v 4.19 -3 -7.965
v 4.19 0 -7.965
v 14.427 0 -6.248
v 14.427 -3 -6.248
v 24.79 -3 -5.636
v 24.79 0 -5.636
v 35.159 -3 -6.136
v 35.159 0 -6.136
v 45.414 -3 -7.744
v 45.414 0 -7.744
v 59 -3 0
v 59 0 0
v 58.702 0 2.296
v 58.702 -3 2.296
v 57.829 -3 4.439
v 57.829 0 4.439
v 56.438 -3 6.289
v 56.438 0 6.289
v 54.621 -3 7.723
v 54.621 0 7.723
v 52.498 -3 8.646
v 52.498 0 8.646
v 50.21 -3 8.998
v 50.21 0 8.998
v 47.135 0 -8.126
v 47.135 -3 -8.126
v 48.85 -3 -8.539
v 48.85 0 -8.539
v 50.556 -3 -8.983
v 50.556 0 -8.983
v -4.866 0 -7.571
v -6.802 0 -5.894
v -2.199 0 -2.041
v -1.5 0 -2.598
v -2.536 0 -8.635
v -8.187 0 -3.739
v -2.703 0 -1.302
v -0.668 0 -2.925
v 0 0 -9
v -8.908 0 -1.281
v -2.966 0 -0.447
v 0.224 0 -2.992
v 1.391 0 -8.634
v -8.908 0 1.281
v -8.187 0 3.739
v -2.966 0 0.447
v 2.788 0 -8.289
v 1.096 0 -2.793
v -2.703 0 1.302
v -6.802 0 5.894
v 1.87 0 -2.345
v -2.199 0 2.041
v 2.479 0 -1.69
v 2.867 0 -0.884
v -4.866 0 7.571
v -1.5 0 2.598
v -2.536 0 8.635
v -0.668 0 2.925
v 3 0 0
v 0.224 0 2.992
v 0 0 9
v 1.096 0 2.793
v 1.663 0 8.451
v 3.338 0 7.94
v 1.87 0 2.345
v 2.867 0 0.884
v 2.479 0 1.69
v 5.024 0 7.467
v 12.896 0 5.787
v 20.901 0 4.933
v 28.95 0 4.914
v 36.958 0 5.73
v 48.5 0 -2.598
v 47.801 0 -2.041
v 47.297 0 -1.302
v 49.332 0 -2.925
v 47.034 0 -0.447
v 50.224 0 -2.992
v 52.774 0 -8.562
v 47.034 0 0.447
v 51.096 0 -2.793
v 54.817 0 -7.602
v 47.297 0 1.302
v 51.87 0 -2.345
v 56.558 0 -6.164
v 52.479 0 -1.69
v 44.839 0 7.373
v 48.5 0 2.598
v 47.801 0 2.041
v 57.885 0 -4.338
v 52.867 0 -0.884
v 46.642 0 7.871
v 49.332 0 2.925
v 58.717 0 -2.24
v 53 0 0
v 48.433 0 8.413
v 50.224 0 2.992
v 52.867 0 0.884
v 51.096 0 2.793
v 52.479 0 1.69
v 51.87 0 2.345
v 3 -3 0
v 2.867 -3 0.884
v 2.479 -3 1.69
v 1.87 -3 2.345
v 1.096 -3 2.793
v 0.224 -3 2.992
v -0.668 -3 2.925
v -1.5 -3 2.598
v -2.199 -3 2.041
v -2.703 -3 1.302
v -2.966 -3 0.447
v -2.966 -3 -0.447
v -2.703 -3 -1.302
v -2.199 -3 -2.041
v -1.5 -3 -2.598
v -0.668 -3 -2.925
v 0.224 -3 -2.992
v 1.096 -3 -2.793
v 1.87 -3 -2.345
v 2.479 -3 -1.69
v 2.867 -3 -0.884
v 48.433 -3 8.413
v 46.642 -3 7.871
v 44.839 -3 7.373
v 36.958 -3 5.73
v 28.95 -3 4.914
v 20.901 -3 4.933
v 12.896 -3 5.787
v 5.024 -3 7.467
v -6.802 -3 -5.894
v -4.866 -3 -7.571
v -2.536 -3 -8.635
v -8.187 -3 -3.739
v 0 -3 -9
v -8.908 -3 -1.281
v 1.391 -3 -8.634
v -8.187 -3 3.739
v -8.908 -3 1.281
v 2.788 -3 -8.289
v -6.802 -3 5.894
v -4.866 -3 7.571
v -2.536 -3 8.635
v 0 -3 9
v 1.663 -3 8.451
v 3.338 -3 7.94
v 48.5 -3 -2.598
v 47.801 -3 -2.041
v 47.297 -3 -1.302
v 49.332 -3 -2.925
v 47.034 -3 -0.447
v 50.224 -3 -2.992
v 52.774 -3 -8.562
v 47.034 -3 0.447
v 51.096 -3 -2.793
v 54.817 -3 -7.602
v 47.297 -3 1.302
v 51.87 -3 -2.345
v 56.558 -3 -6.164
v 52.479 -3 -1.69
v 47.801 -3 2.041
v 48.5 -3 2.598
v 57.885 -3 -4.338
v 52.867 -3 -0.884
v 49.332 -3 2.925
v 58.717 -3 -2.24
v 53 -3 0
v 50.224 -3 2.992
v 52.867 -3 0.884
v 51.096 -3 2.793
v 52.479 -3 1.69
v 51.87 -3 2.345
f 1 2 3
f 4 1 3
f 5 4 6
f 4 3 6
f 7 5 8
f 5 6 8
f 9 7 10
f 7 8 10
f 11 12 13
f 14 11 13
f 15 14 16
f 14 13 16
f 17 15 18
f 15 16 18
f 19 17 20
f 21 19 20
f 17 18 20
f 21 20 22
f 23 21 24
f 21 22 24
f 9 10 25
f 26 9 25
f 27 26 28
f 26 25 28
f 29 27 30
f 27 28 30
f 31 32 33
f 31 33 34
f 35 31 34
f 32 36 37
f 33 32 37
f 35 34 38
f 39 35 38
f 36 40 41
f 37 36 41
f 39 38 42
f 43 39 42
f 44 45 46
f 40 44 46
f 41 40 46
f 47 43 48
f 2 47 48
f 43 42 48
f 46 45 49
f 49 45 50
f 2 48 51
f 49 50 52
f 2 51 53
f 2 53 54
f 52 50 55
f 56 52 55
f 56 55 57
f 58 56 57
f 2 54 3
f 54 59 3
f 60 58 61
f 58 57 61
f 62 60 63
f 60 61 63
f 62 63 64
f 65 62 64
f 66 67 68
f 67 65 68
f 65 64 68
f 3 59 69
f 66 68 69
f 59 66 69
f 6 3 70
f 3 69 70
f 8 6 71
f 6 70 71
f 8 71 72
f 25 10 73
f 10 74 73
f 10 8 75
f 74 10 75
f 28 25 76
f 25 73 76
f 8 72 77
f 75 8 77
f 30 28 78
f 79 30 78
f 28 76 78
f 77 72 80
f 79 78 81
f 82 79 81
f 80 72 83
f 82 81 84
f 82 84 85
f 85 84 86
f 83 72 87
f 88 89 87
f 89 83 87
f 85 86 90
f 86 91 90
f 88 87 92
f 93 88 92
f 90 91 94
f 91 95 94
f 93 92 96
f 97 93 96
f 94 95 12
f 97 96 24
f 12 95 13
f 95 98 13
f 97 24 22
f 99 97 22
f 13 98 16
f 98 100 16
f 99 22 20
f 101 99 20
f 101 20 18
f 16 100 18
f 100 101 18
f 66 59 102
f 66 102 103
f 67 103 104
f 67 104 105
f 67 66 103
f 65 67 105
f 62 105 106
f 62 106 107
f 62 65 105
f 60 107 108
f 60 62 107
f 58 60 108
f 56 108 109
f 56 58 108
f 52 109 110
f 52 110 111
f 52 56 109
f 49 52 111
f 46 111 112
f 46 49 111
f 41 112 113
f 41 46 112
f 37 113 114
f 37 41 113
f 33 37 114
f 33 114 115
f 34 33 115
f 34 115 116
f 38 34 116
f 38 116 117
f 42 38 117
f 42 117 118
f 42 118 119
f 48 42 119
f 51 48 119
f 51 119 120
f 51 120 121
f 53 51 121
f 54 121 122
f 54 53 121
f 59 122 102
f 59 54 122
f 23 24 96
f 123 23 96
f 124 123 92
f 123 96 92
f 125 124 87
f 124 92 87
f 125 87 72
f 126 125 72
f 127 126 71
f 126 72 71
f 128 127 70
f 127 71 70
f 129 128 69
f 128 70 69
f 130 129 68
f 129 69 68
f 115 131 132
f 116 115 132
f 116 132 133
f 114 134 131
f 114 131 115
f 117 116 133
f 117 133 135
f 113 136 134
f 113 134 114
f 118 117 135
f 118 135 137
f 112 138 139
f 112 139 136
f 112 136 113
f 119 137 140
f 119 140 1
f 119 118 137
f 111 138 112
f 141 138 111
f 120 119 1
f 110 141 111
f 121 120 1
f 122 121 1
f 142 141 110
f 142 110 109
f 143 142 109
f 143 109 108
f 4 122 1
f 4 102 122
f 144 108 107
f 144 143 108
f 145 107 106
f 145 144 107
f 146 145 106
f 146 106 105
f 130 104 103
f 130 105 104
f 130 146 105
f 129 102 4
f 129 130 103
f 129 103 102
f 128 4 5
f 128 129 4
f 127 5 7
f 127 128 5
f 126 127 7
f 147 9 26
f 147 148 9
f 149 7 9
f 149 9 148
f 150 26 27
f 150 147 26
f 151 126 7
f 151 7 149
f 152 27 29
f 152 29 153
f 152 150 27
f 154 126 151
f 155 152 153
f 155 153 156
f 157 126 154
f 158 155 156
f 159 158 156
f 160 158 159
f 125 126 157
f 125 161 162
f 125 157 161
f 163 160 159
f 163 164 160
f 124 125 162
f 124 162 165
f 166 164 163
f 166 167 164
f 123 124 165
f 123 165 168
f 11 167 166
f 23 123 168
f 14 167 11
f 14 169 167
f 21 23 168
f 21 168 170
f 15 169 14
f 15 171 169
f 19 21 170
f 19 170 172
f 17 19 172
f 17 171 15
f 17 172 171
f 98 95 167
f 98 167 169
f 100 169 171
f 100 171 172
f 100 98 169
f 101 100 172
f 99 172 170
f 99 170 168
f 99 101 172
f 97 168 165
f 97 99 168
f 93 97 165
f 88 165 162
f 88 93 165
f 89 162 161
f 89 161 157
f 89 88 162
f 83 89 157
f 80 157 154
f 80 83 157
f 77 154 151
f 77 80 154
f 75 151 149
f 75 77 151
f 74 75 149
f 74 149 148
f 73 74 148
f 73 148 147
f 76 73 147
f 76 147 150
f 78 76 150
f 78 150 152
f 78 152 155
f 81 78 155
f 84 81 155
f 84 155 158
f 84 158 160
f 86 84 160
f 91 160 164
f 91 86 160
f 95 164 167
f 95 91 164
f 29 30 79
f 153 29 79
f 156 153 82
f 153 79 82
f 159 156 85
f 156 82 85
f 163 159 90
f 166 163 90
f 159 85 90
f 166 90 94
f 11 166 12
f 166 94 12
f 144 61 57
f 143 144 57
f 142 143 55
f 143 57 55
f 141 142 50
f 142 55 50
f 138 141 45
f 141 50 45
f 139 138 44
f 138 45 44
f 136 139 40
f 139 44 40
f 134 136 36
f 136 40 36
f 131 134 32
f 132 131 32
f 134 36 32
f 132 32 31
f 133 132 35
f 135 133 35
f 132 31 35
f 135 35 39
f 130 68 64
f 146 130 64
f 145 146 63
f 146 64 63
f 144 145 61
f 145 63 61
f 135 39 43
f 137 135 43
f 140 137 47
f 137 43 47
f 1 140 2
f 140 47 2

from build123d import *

# Parameters (mm, degrees)
F0_R     = 3
F1_DEPTH = 3


with BuildPart() as f1:
    # F0 (on Front) → F1 (new body)
    with BuildSketch(Plane.XZ):
        with BuildLine():
            ThreePointArc((5.0238306032, 7.4673372811), (2.4989245726, 8.1910870463), (0, 9))
            ThreePointArc((0, 9), (-9, 0), (0, -9))
            ThreePointArc((0, -9), (2.0891997796, -8.459259966), (4.1899294664, -7.9652050235))
            ThreePointArc((4.1899294664, -7.9652050235), (7.7041990238, -4.6524528371), (9, 0))
            ThreePointArc((9, 0), (7.944006402, 4.2299837217), (5.0238306032, 7.4673372811))
        make_face()
        Circle(F0_R, mode=Mode.SUBTRACT)
        with BuildLine():
            ThreePointArc((44.8388245261, 7.3730772224), (24.9251697087, 4.8191586202), (5.0238306032, 7.4673372811))
            ThreePointArc((5.0238306032, 7.4673372811), (7.944006402, 4.2299837217), (9, 0))
            ThreePointArc((9, 0), (7.7041990238, -4.6524528371), (4.1899294664, -7.9652050235))
            ThreePointArc((4.1899294664, -7.9652050235), (24.7899854963, -5.6356561903), (45.4138690609, -7.7438622799))
            ThreePointArc((45.4138690609, -7.7438622799), (41.0065045418, -0.3421102804), (44.8388245261, 7.3730772224))
        make_face()
        with BuildLine():
            ThreePointArc((50.2100552652, 8.9975483764), (47.5391507079, 8.1366722514), (44.8388245261, 7.3730772224))
            ThreePointArc((44.8388245261, 7.3730772224), (41.0065045418, -0.3421102804), (45.4138690609, -7.7438622799))
            ThreePointArc((45.4138690609, -7.7438622799), (47.9935464321, -8.3282112662), (50.5563037426, -8.9827905545))
            ThreePointArc((50.5563037426, -8.9827905545), (56.5576952386, -6.16414091), (59, 0))
            ThreePointArc((59, 0), (56.4377984353, 6.2892568167), (50.2100552652, 8.9975483764))
        make_face()
        with Locations((50, 0)):
            Circle(F0_R, mode=Mode.SUBTRACT)
    extrude(amount=F1_DEPTH)


solid = f1.part
